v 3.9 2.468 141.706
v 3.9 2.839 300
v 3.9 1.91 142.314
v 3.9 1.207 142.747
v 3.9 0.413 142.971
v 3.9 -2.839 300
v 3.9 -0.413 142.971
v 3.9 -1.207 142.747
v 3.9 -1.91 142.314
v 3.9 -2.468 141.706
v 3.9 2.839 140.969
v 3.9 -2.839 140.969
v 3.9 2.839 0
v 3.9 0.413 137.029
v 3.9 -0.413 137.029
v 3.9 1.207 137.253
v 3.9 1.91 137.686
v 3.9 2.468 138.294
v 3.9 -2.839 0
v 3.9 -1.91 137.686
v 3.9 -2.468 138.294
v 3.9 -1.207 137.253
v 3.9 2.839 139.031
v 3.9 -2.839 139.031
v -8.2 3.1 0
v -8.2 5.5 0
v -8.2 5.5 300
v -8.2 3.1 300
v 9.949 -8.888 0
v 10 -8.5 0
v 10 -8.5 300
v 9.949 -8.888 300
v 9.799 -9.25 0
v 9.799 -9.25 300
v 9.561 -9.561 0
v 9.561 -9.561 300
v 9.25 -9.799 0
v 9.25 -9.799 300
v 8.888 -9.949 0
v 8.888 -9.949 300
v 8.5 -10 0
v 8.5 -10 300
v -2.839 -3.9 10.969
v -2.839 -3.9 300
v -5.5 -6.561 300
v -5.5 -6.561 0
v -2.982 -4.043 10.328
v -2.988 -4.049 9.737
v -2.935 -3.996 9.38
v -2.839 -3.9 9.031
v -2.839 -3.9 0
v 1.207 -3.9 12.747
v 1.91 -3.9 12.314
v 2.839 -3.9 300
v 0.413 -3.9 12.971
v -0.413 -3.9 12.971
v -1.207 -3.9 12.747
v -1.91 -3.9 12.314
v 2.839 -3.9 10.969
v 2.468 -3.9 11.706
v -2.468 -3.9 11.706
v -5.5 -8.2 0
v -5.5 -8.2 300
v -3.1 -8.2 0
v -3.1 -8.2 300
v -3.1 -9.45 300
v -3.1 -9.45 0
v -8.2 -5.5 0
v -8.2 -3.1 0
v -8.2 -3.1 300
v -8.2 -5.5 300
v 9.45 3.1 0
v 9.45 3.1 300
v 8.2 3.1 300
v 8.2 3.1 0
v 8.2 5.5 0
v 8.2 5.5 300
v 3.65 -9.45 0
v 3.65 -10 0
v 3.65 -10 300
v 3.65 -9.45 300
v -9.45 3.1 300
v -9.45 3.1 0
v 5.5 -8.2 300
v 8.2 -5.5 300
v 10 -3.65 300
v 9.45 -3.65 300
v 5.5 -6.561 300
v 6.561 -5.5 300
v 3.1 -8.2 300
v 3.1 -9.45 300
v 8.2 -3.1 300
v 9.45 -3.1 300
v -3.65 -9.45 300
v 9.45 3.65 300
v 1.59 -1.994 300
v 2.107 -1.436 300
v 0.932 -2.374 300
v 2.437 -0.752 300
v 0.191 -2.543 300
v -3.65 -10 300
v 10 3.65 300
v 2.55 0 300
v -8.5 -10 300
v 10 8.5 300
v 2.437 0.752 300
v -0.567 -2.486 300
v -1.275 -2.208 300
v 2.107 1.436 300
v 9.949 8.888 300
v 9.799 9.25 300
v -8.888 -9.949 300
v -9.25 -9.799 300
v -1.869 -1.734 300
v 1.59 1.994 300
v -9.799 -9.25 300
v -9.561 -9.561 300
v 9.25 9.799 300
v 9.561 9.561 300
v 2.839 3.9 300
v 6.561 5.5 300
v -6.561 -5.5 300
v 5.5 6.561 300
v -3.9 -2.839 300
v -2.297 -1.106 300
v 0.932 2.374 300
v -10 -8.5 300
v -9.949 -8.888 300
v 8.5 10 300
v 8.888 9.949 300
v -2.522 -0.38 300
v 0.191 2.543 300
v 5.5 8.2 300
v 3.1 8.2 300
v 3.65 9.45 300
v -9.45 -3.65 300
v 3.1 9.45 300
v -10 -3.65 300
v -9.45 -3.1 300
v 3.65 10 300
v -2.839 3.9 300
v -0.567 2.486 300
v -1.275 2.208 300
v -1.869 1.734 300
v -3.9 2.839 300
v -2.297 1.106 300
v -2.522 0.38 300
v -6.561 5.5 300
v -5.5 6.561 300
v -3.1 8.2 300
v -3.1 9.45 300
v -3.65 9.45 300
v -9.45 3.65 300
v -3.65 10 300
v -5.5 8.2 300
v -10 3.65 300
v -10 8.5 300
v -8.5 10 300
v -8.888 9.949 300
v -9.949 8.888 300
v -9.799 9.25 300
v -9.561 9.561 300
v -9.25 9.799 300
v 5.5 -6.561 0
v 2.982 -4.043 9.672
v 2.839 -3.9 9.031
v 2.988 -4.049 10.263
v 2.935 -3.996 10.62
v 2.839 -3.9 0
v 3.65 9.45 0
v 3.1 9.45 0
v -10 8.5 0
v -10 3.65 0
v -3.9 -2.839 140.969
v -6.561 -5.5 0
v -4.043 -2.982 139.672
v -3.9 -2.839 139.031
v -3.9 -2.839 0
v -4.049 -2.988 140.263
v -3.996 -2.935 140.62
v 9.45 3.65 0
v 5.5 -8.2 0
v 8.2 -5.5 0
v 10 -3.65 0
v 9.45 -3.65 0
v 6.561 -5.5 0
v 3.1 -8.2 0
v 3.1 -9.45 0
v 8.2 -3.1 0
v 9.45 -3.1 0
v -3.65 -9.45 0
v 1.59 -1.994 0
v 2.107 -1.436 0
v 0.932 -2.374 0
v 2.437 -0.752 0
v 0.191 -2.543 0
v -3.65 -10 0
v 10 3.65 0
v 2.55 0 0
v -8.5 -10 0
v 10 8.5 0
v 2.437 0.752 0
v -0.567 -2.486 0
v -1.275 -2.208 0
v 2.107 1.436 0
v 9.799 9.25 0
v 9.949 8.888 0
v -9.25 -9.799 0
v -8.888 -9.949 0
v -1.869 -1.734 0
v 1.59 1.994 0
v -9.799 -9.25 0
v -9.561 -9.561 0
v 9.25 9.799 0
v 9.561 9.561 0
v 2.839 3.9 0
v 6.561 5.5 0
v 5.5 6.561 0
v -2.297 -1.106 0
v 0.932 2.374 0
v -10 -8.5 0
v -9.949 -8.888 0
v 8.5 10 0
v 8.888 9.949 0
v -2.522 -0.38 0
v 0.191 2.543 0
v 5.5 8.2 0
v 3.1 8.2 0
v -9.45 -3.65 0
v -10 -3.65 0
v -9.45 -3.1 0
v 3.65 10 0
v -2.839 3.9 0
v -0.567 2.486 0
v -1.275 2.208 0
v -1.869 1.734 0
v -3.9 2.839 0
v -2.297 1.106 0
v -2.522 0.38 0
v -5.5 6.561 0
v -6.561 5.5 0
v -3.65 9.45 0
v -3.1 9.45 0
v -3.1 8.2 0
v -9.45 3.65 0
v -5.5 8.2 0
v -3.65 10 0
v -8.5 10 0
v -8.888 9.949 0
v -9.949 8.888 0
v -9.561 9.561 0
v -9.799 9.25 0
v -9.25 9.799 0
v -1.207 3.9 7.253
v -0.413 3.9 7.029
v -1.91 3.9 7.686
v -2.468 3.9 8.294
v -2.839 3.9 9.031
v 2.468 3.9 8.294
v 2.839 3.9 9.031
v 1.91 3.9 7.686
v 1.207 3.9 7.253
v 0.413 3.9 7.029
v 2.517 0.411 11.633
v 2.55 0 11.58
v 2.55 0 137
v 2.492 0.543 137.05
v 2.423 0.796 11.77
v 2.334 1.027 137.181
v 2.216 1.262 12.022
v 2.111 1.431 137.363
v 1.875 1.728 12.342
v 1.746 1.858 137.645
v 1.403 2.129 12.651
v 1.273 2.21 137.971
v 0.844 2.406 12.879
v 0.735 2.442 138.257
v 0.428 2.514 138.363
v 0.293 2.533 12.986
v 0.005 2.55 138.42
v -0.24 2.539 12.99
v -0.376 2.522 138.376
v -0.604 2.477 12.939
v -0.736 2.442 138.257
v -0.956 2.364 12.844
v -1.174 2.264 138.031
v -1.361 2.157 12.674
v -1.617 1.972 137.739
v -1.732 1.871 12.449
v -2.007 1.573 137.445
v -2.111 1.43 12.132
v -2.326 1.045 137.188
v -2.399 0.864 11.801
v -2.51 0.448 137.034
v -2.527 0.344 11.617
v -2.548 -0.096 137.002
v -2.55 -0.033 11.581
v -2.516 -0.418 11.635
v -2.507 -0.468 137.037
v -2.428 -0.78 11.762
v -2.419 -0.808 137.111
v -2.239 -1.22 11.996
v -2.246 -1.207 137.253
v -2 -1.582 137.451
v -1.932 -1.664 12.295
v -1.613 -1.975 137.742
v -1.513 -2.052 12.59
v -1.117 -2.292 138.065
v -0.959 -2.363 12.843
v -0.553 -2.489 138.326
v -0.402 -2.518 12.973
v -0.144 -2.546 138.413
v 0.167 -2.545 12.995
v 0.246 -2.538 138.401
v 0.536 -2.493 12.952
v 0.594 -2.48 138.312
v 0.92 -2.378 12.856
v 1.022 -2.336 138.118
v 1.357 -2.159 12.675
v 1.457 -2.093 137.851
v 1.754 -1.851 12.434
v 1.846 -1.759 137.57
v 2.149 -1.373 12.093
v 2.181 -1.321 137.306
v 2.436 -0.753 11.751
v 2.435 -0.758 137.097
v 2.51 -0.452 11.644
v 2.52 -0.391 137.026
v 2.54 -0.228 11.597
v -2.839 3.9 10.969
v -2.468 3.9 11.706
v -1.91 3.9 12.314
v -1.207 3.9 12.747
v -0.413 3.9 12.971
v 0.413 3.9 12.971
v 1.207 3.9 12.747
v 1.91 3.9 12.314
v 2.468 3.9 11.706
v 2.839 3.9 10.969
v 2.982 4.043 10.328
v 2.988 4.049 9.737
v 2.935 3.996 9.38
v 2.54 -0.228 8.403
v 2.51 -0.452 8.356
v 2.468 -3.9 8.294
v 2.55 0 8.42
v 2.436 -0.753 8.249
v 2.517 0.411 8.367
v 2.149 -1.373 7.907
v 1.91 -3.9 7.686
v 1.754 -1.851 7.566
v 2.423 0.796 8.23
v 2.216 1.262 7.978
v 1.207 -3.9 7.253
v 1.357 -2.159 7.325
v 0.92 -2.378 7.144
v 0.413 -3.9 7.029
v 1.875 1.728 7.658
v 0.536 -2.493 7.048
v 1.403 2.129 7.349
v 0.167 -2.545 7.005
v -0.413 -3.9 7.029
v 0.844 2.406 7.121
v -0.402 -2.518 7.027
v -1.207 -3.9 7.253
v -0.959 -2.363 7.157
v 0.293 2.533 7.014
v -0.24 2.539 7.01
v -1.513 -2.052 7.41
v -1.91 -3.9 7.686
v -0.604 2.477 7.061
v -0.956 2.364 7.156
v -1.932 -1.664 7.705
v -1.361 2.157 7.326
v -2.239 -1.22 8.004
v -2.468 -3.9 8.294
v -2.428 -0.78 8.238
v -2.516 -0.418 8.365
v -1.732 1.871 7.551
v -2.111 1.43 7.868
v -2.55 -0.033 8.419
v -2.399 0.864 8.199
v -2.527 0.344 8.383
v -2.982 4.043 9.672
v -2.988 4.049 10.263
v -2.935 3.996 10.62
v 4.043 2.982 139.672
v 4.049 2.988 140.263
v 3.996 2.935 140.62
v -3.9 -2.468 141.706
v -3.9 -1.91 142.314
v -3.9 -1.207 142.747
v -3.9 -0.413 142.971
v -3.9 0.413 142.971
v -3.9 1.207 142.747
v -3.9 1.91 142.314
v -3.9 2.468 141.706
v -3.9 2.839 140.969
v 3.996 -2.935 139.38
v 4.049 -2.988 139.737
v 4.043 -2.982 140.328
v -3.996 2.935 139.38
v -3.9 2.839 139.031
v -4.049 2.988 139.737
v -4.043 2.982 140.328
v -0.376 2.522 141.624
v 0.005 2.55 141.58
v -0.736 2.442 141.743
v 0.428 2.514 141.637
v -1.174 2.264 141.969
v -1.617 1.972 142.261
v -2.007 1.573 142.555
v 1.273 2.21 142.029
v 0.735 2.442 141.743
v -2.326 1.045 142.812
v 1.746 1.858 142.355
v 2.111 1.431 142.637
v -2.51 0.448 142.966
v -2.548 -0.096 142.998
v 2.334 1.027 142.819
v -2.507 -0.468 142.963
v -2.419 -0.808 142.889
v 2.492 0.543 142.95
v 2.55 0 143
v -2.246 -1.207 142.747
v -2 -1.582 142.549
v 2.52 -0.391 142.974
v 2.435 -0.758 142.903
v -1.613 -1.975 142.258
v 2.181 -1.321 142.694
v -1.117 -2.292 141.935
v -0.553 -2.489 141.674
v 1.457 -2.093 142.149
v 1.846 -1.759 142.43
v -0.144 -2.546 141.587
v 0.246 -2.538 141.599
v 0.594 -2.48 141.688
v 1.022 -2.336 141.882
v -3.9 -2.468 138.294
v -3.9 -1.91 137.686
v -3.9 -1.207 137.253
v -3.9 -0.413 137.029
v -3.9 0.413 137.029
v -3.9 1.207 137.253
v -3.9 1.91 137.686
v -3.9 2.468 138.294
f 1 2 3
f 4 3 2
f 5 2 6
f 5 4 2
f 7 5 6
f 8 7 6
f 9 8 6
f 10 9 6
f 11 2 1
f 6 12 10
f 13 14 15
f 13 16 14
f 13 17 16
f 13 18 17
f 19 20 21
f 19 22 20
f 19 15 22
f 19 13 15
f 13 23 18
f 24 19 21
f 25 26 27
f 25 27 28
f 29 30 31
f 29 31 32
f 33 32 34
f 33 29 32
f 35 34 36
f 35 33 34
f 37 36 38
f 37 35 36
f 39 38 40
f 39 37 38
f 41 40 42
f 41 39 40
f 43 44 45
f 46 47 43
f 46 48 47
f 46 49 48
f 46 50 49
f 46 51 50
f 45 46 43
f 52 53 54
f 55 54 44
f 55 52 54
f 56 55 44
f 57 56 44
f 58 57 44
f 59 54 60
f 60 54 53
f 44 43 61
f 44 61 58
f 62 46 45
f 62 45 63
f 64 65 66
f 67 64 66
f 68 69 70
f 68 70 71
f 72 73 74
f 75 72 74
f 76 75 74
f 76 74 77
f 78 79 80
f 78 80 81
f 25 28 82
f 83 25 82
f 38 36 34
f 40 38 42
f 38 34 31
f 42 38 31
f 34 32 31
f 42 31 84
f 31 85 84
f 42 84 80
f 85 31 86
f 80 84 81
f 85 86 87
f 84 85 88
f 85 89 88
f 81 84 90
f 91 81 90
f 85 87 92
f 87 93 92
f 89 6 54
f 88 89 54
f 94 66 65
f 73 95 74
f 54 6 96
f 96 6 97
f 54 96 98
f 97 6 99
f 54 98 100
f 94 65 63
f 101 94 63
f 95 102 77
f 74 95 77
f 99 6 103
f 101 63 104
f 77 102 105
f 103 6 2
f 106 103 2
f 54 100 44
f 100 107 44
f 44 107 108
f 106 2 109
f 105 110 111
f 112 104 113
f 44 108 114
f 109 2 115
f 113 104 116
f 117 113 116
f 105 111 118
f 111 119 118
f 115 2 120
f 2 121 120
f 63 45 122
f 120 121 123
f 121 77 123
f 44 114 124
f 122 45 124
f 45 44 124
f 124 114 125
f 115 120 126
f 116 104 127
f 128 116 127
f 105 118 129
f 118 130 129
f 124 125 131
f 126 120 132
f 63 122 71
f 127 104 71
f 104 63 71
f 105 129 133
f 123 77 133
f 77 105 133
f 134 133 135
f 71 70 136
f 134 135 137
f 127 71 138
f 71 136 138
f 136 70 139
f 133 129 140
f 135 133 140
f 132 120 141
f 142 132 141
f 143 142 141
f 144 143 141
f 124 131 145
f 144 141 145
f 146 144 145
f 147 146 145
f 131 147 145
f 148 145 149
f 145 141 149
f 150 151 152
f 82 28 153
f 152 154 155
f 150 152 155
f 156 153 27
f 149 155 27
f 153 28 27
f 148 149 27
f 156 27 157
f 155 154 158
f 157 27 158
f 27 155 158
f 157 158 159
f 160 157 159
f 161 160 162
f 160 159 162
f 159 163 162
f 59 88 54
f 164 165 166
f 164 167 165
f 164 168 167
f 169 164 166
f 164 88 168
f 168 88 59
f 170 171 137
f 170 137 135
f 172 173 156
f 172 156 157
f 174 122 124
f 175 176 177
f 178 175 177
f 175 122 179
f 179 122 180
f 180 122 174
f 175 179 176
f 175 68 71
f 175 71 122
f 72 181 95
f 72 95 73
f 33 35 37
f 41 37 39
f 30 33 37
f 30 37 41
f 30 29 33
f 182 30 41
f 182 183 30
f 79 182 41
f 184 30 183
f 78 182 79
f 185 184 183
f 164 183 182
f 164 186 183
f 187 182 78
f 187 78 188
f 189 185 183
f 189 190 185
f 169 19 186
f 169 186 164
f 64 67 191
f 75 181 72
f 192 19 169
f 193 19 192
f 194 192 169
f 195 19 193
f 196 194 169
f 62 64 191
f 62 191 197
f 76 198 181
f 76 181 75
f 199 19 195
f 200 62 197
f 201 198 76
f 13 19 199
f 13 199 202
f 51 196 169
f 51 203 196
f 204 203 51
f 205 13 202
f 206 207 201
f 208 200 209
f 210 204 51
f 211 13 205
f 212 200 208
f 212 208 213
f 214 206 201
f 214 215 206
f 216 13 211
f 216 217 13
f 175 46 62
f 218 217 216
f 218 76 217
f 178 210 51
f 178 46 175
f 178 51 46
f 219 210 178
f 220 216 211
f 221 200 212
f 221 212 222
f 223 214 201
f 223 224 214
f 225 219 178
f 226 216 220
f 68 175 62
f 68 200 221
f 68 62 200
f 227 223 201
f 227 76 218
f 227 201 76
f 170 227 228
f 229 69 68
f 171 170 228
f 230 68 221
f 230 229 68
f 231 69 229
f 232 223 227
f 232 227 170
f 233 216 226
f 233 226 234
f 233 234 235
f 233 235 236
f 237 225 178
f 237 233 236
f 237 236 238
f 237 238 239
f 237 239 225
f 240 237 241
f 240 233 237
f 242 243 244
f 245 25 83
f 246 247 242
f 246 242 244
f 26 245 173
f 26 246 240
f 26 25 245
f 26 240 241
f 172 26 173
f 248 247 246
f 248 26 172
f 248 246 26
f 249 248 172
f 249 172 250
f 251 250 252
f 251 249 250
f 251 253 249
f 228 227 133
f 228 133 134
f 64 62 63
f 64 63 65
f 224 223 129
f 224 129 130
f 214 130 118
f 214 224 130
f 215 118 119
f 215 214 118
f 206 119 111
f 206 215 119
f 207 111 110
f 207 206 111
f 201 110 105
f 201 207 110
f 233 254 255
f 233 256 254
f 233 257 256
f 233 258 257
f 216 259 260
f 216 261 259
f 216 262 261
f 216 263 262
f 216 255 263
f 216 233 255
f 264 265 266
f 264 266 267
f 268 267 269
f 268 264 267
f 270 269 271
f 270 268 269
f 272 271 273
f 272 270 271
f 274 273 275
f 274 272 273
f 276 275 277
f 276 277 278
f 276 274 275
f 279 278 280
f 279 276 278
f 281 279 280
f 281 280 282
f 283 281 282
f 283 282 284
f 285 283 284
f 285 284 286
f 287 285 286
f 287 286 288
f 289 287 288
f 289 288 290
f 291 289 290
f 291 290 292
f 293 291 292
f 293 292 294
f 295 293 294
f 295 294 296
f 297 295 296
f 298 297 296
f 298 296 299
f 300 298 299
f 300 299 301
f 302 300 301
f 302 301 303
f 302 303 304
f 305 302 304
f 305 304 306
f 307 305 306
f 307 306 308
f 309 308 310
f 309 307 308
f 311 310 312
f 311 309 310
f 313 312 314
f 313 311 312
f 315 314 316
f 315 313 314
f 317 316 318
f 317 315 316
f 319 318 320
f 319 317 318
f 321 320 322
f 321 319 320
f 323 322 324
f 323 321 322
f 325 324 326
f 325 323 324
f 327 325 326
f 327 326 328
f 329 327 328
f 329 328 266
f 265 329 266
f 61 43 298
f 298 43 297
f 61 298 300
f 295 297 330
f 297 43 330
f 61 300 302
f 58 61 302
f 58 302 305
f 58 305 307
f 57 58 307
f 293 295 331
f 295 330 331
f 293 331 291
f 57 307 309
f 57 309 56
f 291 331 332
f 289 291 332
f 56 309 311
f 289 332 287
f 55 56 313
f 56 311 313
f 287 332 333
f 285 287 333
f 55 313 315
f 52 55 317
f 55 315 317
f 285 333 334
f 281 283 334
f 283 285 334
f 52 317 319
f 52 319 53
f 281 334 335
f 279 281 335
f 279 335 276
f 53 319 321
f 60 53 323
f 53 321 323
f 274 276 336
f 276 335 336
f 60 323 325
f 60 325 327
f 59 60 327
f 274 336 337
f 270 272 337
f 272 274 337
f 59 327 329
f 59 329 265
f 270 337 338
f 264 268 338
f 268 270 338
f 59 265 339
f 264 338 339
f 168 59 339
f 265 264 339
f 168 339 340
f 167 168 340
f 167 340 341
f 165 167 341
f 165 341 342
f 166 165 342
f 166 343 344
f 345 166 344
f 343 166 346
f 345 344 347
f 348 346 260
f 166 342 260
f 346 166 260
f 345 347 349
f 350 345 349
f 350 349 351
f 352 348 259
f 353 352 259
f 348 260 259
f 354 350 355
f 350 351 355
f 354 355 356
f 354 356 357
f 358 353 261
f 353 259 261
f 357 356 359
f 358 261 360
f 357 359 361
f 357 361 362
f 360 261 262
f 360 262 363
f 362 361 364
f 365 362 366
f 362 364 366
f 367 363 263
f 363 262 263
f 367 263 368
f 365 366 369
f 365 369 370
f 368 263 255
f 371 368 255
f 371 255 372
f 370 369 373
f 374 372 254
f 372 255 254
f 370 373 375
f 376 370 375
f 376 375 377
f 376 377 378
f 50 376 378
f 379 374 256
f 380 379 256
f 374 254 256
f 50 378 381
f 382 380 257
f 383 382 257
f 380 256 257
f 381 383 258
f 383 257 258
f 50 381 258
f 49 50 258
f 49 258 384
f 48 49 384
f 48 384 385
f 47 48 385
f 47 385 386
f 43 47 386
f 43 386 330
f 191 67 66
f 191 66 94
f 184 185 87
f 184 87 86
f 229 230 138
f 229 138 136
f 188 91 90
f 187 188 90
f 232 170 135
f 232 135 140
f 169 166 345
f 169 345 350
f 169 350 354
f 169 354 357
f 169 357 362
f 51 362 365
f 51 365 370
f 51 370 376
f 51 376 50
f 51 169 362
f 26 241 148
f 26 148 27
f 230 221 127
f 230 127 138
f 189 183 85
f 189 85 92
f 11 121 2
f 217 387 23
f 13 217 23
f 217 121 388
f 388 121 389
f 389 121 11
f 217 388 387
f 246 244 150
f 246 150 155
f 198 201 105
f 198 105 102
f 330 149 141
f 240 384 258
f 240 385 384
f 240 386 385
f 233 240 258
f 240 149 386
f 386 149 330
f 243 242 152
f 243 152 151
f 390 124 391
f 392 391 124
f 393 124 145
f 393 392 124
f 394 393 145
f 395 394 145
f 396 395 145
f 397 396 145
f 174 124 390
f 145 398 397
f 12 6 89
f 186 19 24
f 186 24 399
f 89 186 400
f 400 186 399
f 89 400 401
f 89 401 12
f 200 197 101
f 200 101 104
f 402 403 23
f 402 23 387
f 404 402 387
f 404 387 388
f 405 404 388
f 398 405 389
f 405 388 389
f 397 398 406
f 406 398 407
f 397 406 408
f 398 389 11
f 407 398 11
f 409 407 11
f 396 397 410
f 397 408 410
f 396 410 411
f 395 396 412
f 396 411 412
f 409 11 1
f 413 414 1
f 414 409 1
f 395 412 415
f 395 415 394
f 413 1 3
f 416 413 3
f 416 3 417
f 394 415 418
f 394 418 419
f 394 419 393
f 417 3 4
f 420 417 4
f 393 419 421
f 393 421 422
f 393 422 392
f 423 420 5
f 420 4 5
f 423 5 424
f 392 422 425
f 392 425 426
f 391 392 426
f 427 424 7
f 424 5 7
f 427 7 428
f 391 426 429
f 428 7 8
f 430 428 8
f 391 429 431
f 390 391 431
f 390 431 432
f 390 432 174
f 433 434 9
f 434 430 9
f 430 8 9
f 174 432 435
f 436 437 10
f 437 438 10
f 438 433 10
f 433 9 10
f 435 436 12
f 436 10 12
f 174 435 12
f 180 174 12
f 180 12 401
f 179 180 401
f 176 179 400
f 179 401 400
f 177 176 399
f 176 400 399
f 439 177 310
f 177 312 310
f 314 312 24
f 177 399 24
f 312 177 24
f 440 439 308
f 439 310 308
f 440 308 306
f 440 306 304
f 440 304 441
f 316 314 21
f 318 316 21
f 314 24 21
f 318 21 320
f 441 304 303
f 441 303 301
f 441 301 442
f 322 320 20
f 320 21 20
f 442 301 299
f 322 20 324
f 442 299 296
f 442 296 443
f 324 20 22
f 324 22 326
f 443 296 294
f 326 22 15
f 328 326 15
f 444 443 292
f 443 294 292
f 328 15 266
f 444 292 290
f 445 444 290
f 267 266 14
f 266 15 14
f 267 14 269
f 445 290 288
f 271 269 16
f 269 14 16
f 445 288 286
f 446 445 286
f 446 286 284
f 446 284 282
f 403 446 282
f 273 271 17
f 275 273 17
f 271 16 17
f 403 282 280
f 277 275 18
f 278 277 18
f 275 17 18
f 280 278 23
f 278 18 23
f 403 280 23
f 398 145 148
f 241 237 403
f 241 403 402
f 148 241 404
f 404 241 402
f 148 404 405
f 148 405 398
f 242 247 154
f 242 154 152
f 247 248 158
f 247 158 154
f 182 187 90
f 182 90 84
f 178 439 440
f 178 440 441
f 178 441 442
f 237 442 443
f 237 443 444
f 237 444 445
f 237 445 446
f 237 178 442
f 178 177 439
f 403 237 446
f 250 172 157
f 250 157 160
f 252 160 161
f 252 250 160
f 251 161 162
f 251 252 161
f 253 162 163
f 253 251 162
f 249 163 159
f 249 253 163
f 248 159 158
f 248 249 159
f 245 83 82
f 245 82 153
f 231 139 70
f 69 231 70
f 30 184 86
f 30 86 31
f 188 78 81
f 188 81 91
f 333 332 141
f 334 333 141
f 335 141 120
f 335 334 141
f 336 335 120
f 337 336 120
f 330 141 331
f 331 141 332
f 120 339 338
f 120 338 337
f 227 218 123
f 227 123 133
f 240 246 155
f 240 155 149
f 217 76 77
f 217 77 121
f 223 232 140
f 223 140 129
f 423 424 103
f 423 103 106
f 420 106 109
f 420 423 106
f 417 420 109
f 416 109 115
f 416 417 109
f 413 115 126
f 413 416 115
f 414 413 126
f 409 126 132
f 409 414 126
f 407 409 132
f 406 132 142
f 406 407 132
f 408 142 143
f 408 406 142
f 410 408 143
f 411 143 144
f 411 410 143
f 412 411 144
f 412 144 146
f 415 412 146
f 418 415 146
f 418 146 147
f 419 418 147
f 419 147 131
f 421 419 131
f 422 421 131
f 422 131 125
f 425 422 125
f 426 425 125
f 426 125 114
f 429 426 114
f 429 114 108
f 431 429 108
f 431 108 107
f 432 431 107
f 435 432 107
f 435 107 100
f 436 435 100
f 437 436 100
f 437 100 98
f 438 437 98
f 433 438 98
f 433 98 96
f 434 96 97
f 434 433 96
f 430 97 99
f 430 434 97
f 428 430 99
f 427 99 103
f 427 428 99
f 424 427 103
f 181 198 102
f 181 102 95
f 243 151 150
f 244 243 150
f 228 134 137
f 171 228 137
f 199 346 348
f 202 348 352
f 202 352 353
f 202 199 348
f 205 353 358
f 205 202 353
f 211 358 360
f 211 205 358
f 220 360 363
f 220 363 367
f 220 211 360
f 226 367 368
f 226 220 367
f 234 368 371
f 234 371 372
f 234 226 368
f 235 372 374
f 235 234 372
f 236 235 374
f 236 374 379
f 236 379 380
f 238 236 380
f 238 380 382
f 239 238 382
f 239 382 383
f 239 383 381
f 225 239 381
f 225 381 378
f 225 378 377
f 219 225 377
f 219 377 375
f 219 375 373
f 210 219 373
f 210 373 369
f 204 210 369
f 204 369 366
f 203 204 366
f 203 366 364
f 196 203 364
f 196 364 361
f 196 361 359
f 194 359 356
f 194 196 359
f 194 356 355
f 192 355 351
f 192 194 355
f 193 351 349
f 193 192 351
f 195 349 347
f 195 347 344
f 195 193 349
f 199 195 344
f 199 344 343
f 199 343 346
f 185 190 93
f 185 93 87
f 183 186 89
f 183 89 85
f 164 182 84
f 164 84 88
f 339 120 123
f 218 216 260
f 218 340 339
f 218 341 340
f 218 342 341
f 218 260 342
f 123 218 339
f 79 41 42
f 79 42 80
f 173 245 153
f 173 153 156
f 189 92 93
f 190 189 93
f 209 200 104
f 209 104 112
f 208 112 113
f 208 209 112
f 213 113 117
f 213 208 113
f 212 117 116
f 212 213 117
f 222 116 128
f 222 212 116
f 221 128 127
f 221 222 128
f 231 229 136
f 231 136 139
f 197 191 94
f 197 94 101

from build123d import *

# Parameters (mm, degrees)
SKETCH_1_R          = 2.55
EXTRUDE_1_DEPTH     = 300
SKETCH_2_R          = 3
CUT_EXTRUDE_1_DEPTH = 301.83217913
SKETCH_3_R          = 3
CUT_EXTRUDE_2_DEPTH = 301.83217923


with BuildPart() as part:
    # 草图1 → 凸台-拉伸1 (new body)
    with BuildSketch(Plane.XY):
        with BuildLine():
            Line((-3.9, 2.839339828), (-6.560660172, 5.5))
            Line((-6.560660172, 5.5), (-8.2, 5.5))
            Line((-8.2, 5.5), (-8.2, 3.1))
            Line((-8.2, 3.1), (-9.45, 3.1))
            Line((-9.45, 3.1), (-9.45, 3.65))
            Line((-9.45, 3.65), (-10, 3.65))
            Line((-10, 3.65), (-10, 8.5))
            ThreePointArc((-10, 8.5), (-9.560660172, 9.560660172), (-8.5, 10))
            Line((-8.5, 10), (-3.65, 10))
            Line((-3.65, 10), (-3.65, 9.45))
            Line((-3.65, 9.45), (-3.1, 9.45))
            Line((-3.1, 9.45), (-3.1, 8.2))
            Line((-3.1, 8.2), (-5.5, 8.2))
            Line((-5.5, 8.2), (-5.5, 6.560660172))
            Line((-5.5, 6.560660172), (-2.839339828, 3.9))
            Line((-2.839339828, 3.9), (2.839339828, 3.9))
            Line((2.839339828, 3.9), (5.5, 6.560660172))
            Line((5.5, 6.560660172), (5.5, 8.2))
            Line((5.5, 8.2), (3.1, 8.2))
            Line((3.1, 8.2), (3.1, 9.45))
            Line((3.1, 9.45), (3.65, 9.45))
            Line((3.65, 9.45), (3.65, 10))
            Line((3.65, 10), (8.5, 10))
            ThreePointArc((8.5, 10), (9.560660172, 9.560660172), (10, 8.5))
            Line((10, 8.5), (10, 3.65))
            Line((10, 3.65), (9.45, 3.65))
            Line((9.45, 3.65), (9.45, 3.1))
            Line((9.45, 3.1), (8.2, 3.1))
            Line((8.2, 3.1), (8.2, 5.5))
            Line((8.2, 5.5), (6.560660172, 5.5))
            Line((6.560660172, 5.5), (3.9, 2.839339828))
            Line((3.9, 2.839339828), (3.9, -2.839339828))
            Line((3.9, -2.839339828), (6.560660172, -5.5))
            Line((6.560660172, -5.5), (8.2, -5.5))
            Line((8.2, -5.5), (8.2, -3.1))
            Line((8.2, -3.1), (9.45, -3.1))
            Line((9.45, -3.1), (9.45, -3.65))
            Line((9.45, -3.65), (10, -3.65))
            Line((10, -3.65), (10, -8.5))
            ThreePointArc((10, -8.5), (9.560660172, -9.560660172), (8.5, -10))
            Line((8.5, -10), (3.65, -10))
            Line((3.65, -10), (3.65, -9.45))
            Line((3.65, -9.45), (3.1, -9.45))
            Line((3.1, -9.45), (3.1, -8.2))
            Line((3.1, -8.2), (5.5, -8.2))
            Line((5.5, -8.2), (5.5, -6.560660172))
            Line((5.5, -6.560660172), (2.839339828, -3.9))
            Line((2.839339828, -3.9), (-2.839339828, -3.9))
            Line((-2.839339828, -3.9), (-5.5, -6.560660172))
            Line((-5.5, -6.560660172), (-5.5, -8.2))
            Line((-5.5, -8.2), (-3.1, -8.2))
            Line((-3.1, -8.2), (-3.1, -9.45))
            Line((-3.1, -9.45), (-3.65, -9.45))
            Line((-3.65, -9.45), (-3.65, -10))
            Line((-3.65, -10), (-8.5, -10))
            ThreePointArc((-8.5, -10), (-9.560660172, -9.560660172), (-10, -8.5))
            Line((-10, -8.5), (-10, -3.65))
            Line((-10, -3.65), (-9.45, -3.65))
            Line((-9.45, -3.65), (-9.45, -3.1))
            Line((-9.45, -3.1), (-8.2, -3.1))
            Line((-8.2, -3.1), (-8.2, -5.5))
            Line((-8.2, -5.5), (-6.560660172, -5.5))
            Line((-6.560660172, -5.5), (-3.9, -2.839339828))
            Line((-3.9, -2.839339828), (-3.9, 2.839339828))
        make_face()
        Circle(SKETCH_1_R, mode=Mode.SUBTRACT)
    extrude(amount=EXTRUDE_1_DEPTH)

    # 草图2 → 切除-拉伸1 (cut, through all)
    with BuildSketch(Plane(origin=(0, 10, 0), x_dir=(1, 0, 0), z_dir=(0, 1, 0))):
        with Locations(Location((0, -10, 0), (0, 0, 198.835996158))):
            Circle(SKETCH_2_R)
    extrude(amount=-CUT_EXTRUDE_1_DEPTH, mode=Mode.SUBTRACT)

    # 草图3 → 切除-拉伸2 (cut, through all)
    with BuildSketch(Plane(origin=(10, 0, 0), x_dir=(0, 0, -1), z_dir=(1, 0, 0))):
        with Locations(Location((-140, 0, 0), (0, 0, 71.164003842))):
            Circle(SKETCH_3_R)
    extrude(amount=-CUT_EXTRUDE_2_DEPTH, mode=Mode.SUBTRACT)


solid = part.part
